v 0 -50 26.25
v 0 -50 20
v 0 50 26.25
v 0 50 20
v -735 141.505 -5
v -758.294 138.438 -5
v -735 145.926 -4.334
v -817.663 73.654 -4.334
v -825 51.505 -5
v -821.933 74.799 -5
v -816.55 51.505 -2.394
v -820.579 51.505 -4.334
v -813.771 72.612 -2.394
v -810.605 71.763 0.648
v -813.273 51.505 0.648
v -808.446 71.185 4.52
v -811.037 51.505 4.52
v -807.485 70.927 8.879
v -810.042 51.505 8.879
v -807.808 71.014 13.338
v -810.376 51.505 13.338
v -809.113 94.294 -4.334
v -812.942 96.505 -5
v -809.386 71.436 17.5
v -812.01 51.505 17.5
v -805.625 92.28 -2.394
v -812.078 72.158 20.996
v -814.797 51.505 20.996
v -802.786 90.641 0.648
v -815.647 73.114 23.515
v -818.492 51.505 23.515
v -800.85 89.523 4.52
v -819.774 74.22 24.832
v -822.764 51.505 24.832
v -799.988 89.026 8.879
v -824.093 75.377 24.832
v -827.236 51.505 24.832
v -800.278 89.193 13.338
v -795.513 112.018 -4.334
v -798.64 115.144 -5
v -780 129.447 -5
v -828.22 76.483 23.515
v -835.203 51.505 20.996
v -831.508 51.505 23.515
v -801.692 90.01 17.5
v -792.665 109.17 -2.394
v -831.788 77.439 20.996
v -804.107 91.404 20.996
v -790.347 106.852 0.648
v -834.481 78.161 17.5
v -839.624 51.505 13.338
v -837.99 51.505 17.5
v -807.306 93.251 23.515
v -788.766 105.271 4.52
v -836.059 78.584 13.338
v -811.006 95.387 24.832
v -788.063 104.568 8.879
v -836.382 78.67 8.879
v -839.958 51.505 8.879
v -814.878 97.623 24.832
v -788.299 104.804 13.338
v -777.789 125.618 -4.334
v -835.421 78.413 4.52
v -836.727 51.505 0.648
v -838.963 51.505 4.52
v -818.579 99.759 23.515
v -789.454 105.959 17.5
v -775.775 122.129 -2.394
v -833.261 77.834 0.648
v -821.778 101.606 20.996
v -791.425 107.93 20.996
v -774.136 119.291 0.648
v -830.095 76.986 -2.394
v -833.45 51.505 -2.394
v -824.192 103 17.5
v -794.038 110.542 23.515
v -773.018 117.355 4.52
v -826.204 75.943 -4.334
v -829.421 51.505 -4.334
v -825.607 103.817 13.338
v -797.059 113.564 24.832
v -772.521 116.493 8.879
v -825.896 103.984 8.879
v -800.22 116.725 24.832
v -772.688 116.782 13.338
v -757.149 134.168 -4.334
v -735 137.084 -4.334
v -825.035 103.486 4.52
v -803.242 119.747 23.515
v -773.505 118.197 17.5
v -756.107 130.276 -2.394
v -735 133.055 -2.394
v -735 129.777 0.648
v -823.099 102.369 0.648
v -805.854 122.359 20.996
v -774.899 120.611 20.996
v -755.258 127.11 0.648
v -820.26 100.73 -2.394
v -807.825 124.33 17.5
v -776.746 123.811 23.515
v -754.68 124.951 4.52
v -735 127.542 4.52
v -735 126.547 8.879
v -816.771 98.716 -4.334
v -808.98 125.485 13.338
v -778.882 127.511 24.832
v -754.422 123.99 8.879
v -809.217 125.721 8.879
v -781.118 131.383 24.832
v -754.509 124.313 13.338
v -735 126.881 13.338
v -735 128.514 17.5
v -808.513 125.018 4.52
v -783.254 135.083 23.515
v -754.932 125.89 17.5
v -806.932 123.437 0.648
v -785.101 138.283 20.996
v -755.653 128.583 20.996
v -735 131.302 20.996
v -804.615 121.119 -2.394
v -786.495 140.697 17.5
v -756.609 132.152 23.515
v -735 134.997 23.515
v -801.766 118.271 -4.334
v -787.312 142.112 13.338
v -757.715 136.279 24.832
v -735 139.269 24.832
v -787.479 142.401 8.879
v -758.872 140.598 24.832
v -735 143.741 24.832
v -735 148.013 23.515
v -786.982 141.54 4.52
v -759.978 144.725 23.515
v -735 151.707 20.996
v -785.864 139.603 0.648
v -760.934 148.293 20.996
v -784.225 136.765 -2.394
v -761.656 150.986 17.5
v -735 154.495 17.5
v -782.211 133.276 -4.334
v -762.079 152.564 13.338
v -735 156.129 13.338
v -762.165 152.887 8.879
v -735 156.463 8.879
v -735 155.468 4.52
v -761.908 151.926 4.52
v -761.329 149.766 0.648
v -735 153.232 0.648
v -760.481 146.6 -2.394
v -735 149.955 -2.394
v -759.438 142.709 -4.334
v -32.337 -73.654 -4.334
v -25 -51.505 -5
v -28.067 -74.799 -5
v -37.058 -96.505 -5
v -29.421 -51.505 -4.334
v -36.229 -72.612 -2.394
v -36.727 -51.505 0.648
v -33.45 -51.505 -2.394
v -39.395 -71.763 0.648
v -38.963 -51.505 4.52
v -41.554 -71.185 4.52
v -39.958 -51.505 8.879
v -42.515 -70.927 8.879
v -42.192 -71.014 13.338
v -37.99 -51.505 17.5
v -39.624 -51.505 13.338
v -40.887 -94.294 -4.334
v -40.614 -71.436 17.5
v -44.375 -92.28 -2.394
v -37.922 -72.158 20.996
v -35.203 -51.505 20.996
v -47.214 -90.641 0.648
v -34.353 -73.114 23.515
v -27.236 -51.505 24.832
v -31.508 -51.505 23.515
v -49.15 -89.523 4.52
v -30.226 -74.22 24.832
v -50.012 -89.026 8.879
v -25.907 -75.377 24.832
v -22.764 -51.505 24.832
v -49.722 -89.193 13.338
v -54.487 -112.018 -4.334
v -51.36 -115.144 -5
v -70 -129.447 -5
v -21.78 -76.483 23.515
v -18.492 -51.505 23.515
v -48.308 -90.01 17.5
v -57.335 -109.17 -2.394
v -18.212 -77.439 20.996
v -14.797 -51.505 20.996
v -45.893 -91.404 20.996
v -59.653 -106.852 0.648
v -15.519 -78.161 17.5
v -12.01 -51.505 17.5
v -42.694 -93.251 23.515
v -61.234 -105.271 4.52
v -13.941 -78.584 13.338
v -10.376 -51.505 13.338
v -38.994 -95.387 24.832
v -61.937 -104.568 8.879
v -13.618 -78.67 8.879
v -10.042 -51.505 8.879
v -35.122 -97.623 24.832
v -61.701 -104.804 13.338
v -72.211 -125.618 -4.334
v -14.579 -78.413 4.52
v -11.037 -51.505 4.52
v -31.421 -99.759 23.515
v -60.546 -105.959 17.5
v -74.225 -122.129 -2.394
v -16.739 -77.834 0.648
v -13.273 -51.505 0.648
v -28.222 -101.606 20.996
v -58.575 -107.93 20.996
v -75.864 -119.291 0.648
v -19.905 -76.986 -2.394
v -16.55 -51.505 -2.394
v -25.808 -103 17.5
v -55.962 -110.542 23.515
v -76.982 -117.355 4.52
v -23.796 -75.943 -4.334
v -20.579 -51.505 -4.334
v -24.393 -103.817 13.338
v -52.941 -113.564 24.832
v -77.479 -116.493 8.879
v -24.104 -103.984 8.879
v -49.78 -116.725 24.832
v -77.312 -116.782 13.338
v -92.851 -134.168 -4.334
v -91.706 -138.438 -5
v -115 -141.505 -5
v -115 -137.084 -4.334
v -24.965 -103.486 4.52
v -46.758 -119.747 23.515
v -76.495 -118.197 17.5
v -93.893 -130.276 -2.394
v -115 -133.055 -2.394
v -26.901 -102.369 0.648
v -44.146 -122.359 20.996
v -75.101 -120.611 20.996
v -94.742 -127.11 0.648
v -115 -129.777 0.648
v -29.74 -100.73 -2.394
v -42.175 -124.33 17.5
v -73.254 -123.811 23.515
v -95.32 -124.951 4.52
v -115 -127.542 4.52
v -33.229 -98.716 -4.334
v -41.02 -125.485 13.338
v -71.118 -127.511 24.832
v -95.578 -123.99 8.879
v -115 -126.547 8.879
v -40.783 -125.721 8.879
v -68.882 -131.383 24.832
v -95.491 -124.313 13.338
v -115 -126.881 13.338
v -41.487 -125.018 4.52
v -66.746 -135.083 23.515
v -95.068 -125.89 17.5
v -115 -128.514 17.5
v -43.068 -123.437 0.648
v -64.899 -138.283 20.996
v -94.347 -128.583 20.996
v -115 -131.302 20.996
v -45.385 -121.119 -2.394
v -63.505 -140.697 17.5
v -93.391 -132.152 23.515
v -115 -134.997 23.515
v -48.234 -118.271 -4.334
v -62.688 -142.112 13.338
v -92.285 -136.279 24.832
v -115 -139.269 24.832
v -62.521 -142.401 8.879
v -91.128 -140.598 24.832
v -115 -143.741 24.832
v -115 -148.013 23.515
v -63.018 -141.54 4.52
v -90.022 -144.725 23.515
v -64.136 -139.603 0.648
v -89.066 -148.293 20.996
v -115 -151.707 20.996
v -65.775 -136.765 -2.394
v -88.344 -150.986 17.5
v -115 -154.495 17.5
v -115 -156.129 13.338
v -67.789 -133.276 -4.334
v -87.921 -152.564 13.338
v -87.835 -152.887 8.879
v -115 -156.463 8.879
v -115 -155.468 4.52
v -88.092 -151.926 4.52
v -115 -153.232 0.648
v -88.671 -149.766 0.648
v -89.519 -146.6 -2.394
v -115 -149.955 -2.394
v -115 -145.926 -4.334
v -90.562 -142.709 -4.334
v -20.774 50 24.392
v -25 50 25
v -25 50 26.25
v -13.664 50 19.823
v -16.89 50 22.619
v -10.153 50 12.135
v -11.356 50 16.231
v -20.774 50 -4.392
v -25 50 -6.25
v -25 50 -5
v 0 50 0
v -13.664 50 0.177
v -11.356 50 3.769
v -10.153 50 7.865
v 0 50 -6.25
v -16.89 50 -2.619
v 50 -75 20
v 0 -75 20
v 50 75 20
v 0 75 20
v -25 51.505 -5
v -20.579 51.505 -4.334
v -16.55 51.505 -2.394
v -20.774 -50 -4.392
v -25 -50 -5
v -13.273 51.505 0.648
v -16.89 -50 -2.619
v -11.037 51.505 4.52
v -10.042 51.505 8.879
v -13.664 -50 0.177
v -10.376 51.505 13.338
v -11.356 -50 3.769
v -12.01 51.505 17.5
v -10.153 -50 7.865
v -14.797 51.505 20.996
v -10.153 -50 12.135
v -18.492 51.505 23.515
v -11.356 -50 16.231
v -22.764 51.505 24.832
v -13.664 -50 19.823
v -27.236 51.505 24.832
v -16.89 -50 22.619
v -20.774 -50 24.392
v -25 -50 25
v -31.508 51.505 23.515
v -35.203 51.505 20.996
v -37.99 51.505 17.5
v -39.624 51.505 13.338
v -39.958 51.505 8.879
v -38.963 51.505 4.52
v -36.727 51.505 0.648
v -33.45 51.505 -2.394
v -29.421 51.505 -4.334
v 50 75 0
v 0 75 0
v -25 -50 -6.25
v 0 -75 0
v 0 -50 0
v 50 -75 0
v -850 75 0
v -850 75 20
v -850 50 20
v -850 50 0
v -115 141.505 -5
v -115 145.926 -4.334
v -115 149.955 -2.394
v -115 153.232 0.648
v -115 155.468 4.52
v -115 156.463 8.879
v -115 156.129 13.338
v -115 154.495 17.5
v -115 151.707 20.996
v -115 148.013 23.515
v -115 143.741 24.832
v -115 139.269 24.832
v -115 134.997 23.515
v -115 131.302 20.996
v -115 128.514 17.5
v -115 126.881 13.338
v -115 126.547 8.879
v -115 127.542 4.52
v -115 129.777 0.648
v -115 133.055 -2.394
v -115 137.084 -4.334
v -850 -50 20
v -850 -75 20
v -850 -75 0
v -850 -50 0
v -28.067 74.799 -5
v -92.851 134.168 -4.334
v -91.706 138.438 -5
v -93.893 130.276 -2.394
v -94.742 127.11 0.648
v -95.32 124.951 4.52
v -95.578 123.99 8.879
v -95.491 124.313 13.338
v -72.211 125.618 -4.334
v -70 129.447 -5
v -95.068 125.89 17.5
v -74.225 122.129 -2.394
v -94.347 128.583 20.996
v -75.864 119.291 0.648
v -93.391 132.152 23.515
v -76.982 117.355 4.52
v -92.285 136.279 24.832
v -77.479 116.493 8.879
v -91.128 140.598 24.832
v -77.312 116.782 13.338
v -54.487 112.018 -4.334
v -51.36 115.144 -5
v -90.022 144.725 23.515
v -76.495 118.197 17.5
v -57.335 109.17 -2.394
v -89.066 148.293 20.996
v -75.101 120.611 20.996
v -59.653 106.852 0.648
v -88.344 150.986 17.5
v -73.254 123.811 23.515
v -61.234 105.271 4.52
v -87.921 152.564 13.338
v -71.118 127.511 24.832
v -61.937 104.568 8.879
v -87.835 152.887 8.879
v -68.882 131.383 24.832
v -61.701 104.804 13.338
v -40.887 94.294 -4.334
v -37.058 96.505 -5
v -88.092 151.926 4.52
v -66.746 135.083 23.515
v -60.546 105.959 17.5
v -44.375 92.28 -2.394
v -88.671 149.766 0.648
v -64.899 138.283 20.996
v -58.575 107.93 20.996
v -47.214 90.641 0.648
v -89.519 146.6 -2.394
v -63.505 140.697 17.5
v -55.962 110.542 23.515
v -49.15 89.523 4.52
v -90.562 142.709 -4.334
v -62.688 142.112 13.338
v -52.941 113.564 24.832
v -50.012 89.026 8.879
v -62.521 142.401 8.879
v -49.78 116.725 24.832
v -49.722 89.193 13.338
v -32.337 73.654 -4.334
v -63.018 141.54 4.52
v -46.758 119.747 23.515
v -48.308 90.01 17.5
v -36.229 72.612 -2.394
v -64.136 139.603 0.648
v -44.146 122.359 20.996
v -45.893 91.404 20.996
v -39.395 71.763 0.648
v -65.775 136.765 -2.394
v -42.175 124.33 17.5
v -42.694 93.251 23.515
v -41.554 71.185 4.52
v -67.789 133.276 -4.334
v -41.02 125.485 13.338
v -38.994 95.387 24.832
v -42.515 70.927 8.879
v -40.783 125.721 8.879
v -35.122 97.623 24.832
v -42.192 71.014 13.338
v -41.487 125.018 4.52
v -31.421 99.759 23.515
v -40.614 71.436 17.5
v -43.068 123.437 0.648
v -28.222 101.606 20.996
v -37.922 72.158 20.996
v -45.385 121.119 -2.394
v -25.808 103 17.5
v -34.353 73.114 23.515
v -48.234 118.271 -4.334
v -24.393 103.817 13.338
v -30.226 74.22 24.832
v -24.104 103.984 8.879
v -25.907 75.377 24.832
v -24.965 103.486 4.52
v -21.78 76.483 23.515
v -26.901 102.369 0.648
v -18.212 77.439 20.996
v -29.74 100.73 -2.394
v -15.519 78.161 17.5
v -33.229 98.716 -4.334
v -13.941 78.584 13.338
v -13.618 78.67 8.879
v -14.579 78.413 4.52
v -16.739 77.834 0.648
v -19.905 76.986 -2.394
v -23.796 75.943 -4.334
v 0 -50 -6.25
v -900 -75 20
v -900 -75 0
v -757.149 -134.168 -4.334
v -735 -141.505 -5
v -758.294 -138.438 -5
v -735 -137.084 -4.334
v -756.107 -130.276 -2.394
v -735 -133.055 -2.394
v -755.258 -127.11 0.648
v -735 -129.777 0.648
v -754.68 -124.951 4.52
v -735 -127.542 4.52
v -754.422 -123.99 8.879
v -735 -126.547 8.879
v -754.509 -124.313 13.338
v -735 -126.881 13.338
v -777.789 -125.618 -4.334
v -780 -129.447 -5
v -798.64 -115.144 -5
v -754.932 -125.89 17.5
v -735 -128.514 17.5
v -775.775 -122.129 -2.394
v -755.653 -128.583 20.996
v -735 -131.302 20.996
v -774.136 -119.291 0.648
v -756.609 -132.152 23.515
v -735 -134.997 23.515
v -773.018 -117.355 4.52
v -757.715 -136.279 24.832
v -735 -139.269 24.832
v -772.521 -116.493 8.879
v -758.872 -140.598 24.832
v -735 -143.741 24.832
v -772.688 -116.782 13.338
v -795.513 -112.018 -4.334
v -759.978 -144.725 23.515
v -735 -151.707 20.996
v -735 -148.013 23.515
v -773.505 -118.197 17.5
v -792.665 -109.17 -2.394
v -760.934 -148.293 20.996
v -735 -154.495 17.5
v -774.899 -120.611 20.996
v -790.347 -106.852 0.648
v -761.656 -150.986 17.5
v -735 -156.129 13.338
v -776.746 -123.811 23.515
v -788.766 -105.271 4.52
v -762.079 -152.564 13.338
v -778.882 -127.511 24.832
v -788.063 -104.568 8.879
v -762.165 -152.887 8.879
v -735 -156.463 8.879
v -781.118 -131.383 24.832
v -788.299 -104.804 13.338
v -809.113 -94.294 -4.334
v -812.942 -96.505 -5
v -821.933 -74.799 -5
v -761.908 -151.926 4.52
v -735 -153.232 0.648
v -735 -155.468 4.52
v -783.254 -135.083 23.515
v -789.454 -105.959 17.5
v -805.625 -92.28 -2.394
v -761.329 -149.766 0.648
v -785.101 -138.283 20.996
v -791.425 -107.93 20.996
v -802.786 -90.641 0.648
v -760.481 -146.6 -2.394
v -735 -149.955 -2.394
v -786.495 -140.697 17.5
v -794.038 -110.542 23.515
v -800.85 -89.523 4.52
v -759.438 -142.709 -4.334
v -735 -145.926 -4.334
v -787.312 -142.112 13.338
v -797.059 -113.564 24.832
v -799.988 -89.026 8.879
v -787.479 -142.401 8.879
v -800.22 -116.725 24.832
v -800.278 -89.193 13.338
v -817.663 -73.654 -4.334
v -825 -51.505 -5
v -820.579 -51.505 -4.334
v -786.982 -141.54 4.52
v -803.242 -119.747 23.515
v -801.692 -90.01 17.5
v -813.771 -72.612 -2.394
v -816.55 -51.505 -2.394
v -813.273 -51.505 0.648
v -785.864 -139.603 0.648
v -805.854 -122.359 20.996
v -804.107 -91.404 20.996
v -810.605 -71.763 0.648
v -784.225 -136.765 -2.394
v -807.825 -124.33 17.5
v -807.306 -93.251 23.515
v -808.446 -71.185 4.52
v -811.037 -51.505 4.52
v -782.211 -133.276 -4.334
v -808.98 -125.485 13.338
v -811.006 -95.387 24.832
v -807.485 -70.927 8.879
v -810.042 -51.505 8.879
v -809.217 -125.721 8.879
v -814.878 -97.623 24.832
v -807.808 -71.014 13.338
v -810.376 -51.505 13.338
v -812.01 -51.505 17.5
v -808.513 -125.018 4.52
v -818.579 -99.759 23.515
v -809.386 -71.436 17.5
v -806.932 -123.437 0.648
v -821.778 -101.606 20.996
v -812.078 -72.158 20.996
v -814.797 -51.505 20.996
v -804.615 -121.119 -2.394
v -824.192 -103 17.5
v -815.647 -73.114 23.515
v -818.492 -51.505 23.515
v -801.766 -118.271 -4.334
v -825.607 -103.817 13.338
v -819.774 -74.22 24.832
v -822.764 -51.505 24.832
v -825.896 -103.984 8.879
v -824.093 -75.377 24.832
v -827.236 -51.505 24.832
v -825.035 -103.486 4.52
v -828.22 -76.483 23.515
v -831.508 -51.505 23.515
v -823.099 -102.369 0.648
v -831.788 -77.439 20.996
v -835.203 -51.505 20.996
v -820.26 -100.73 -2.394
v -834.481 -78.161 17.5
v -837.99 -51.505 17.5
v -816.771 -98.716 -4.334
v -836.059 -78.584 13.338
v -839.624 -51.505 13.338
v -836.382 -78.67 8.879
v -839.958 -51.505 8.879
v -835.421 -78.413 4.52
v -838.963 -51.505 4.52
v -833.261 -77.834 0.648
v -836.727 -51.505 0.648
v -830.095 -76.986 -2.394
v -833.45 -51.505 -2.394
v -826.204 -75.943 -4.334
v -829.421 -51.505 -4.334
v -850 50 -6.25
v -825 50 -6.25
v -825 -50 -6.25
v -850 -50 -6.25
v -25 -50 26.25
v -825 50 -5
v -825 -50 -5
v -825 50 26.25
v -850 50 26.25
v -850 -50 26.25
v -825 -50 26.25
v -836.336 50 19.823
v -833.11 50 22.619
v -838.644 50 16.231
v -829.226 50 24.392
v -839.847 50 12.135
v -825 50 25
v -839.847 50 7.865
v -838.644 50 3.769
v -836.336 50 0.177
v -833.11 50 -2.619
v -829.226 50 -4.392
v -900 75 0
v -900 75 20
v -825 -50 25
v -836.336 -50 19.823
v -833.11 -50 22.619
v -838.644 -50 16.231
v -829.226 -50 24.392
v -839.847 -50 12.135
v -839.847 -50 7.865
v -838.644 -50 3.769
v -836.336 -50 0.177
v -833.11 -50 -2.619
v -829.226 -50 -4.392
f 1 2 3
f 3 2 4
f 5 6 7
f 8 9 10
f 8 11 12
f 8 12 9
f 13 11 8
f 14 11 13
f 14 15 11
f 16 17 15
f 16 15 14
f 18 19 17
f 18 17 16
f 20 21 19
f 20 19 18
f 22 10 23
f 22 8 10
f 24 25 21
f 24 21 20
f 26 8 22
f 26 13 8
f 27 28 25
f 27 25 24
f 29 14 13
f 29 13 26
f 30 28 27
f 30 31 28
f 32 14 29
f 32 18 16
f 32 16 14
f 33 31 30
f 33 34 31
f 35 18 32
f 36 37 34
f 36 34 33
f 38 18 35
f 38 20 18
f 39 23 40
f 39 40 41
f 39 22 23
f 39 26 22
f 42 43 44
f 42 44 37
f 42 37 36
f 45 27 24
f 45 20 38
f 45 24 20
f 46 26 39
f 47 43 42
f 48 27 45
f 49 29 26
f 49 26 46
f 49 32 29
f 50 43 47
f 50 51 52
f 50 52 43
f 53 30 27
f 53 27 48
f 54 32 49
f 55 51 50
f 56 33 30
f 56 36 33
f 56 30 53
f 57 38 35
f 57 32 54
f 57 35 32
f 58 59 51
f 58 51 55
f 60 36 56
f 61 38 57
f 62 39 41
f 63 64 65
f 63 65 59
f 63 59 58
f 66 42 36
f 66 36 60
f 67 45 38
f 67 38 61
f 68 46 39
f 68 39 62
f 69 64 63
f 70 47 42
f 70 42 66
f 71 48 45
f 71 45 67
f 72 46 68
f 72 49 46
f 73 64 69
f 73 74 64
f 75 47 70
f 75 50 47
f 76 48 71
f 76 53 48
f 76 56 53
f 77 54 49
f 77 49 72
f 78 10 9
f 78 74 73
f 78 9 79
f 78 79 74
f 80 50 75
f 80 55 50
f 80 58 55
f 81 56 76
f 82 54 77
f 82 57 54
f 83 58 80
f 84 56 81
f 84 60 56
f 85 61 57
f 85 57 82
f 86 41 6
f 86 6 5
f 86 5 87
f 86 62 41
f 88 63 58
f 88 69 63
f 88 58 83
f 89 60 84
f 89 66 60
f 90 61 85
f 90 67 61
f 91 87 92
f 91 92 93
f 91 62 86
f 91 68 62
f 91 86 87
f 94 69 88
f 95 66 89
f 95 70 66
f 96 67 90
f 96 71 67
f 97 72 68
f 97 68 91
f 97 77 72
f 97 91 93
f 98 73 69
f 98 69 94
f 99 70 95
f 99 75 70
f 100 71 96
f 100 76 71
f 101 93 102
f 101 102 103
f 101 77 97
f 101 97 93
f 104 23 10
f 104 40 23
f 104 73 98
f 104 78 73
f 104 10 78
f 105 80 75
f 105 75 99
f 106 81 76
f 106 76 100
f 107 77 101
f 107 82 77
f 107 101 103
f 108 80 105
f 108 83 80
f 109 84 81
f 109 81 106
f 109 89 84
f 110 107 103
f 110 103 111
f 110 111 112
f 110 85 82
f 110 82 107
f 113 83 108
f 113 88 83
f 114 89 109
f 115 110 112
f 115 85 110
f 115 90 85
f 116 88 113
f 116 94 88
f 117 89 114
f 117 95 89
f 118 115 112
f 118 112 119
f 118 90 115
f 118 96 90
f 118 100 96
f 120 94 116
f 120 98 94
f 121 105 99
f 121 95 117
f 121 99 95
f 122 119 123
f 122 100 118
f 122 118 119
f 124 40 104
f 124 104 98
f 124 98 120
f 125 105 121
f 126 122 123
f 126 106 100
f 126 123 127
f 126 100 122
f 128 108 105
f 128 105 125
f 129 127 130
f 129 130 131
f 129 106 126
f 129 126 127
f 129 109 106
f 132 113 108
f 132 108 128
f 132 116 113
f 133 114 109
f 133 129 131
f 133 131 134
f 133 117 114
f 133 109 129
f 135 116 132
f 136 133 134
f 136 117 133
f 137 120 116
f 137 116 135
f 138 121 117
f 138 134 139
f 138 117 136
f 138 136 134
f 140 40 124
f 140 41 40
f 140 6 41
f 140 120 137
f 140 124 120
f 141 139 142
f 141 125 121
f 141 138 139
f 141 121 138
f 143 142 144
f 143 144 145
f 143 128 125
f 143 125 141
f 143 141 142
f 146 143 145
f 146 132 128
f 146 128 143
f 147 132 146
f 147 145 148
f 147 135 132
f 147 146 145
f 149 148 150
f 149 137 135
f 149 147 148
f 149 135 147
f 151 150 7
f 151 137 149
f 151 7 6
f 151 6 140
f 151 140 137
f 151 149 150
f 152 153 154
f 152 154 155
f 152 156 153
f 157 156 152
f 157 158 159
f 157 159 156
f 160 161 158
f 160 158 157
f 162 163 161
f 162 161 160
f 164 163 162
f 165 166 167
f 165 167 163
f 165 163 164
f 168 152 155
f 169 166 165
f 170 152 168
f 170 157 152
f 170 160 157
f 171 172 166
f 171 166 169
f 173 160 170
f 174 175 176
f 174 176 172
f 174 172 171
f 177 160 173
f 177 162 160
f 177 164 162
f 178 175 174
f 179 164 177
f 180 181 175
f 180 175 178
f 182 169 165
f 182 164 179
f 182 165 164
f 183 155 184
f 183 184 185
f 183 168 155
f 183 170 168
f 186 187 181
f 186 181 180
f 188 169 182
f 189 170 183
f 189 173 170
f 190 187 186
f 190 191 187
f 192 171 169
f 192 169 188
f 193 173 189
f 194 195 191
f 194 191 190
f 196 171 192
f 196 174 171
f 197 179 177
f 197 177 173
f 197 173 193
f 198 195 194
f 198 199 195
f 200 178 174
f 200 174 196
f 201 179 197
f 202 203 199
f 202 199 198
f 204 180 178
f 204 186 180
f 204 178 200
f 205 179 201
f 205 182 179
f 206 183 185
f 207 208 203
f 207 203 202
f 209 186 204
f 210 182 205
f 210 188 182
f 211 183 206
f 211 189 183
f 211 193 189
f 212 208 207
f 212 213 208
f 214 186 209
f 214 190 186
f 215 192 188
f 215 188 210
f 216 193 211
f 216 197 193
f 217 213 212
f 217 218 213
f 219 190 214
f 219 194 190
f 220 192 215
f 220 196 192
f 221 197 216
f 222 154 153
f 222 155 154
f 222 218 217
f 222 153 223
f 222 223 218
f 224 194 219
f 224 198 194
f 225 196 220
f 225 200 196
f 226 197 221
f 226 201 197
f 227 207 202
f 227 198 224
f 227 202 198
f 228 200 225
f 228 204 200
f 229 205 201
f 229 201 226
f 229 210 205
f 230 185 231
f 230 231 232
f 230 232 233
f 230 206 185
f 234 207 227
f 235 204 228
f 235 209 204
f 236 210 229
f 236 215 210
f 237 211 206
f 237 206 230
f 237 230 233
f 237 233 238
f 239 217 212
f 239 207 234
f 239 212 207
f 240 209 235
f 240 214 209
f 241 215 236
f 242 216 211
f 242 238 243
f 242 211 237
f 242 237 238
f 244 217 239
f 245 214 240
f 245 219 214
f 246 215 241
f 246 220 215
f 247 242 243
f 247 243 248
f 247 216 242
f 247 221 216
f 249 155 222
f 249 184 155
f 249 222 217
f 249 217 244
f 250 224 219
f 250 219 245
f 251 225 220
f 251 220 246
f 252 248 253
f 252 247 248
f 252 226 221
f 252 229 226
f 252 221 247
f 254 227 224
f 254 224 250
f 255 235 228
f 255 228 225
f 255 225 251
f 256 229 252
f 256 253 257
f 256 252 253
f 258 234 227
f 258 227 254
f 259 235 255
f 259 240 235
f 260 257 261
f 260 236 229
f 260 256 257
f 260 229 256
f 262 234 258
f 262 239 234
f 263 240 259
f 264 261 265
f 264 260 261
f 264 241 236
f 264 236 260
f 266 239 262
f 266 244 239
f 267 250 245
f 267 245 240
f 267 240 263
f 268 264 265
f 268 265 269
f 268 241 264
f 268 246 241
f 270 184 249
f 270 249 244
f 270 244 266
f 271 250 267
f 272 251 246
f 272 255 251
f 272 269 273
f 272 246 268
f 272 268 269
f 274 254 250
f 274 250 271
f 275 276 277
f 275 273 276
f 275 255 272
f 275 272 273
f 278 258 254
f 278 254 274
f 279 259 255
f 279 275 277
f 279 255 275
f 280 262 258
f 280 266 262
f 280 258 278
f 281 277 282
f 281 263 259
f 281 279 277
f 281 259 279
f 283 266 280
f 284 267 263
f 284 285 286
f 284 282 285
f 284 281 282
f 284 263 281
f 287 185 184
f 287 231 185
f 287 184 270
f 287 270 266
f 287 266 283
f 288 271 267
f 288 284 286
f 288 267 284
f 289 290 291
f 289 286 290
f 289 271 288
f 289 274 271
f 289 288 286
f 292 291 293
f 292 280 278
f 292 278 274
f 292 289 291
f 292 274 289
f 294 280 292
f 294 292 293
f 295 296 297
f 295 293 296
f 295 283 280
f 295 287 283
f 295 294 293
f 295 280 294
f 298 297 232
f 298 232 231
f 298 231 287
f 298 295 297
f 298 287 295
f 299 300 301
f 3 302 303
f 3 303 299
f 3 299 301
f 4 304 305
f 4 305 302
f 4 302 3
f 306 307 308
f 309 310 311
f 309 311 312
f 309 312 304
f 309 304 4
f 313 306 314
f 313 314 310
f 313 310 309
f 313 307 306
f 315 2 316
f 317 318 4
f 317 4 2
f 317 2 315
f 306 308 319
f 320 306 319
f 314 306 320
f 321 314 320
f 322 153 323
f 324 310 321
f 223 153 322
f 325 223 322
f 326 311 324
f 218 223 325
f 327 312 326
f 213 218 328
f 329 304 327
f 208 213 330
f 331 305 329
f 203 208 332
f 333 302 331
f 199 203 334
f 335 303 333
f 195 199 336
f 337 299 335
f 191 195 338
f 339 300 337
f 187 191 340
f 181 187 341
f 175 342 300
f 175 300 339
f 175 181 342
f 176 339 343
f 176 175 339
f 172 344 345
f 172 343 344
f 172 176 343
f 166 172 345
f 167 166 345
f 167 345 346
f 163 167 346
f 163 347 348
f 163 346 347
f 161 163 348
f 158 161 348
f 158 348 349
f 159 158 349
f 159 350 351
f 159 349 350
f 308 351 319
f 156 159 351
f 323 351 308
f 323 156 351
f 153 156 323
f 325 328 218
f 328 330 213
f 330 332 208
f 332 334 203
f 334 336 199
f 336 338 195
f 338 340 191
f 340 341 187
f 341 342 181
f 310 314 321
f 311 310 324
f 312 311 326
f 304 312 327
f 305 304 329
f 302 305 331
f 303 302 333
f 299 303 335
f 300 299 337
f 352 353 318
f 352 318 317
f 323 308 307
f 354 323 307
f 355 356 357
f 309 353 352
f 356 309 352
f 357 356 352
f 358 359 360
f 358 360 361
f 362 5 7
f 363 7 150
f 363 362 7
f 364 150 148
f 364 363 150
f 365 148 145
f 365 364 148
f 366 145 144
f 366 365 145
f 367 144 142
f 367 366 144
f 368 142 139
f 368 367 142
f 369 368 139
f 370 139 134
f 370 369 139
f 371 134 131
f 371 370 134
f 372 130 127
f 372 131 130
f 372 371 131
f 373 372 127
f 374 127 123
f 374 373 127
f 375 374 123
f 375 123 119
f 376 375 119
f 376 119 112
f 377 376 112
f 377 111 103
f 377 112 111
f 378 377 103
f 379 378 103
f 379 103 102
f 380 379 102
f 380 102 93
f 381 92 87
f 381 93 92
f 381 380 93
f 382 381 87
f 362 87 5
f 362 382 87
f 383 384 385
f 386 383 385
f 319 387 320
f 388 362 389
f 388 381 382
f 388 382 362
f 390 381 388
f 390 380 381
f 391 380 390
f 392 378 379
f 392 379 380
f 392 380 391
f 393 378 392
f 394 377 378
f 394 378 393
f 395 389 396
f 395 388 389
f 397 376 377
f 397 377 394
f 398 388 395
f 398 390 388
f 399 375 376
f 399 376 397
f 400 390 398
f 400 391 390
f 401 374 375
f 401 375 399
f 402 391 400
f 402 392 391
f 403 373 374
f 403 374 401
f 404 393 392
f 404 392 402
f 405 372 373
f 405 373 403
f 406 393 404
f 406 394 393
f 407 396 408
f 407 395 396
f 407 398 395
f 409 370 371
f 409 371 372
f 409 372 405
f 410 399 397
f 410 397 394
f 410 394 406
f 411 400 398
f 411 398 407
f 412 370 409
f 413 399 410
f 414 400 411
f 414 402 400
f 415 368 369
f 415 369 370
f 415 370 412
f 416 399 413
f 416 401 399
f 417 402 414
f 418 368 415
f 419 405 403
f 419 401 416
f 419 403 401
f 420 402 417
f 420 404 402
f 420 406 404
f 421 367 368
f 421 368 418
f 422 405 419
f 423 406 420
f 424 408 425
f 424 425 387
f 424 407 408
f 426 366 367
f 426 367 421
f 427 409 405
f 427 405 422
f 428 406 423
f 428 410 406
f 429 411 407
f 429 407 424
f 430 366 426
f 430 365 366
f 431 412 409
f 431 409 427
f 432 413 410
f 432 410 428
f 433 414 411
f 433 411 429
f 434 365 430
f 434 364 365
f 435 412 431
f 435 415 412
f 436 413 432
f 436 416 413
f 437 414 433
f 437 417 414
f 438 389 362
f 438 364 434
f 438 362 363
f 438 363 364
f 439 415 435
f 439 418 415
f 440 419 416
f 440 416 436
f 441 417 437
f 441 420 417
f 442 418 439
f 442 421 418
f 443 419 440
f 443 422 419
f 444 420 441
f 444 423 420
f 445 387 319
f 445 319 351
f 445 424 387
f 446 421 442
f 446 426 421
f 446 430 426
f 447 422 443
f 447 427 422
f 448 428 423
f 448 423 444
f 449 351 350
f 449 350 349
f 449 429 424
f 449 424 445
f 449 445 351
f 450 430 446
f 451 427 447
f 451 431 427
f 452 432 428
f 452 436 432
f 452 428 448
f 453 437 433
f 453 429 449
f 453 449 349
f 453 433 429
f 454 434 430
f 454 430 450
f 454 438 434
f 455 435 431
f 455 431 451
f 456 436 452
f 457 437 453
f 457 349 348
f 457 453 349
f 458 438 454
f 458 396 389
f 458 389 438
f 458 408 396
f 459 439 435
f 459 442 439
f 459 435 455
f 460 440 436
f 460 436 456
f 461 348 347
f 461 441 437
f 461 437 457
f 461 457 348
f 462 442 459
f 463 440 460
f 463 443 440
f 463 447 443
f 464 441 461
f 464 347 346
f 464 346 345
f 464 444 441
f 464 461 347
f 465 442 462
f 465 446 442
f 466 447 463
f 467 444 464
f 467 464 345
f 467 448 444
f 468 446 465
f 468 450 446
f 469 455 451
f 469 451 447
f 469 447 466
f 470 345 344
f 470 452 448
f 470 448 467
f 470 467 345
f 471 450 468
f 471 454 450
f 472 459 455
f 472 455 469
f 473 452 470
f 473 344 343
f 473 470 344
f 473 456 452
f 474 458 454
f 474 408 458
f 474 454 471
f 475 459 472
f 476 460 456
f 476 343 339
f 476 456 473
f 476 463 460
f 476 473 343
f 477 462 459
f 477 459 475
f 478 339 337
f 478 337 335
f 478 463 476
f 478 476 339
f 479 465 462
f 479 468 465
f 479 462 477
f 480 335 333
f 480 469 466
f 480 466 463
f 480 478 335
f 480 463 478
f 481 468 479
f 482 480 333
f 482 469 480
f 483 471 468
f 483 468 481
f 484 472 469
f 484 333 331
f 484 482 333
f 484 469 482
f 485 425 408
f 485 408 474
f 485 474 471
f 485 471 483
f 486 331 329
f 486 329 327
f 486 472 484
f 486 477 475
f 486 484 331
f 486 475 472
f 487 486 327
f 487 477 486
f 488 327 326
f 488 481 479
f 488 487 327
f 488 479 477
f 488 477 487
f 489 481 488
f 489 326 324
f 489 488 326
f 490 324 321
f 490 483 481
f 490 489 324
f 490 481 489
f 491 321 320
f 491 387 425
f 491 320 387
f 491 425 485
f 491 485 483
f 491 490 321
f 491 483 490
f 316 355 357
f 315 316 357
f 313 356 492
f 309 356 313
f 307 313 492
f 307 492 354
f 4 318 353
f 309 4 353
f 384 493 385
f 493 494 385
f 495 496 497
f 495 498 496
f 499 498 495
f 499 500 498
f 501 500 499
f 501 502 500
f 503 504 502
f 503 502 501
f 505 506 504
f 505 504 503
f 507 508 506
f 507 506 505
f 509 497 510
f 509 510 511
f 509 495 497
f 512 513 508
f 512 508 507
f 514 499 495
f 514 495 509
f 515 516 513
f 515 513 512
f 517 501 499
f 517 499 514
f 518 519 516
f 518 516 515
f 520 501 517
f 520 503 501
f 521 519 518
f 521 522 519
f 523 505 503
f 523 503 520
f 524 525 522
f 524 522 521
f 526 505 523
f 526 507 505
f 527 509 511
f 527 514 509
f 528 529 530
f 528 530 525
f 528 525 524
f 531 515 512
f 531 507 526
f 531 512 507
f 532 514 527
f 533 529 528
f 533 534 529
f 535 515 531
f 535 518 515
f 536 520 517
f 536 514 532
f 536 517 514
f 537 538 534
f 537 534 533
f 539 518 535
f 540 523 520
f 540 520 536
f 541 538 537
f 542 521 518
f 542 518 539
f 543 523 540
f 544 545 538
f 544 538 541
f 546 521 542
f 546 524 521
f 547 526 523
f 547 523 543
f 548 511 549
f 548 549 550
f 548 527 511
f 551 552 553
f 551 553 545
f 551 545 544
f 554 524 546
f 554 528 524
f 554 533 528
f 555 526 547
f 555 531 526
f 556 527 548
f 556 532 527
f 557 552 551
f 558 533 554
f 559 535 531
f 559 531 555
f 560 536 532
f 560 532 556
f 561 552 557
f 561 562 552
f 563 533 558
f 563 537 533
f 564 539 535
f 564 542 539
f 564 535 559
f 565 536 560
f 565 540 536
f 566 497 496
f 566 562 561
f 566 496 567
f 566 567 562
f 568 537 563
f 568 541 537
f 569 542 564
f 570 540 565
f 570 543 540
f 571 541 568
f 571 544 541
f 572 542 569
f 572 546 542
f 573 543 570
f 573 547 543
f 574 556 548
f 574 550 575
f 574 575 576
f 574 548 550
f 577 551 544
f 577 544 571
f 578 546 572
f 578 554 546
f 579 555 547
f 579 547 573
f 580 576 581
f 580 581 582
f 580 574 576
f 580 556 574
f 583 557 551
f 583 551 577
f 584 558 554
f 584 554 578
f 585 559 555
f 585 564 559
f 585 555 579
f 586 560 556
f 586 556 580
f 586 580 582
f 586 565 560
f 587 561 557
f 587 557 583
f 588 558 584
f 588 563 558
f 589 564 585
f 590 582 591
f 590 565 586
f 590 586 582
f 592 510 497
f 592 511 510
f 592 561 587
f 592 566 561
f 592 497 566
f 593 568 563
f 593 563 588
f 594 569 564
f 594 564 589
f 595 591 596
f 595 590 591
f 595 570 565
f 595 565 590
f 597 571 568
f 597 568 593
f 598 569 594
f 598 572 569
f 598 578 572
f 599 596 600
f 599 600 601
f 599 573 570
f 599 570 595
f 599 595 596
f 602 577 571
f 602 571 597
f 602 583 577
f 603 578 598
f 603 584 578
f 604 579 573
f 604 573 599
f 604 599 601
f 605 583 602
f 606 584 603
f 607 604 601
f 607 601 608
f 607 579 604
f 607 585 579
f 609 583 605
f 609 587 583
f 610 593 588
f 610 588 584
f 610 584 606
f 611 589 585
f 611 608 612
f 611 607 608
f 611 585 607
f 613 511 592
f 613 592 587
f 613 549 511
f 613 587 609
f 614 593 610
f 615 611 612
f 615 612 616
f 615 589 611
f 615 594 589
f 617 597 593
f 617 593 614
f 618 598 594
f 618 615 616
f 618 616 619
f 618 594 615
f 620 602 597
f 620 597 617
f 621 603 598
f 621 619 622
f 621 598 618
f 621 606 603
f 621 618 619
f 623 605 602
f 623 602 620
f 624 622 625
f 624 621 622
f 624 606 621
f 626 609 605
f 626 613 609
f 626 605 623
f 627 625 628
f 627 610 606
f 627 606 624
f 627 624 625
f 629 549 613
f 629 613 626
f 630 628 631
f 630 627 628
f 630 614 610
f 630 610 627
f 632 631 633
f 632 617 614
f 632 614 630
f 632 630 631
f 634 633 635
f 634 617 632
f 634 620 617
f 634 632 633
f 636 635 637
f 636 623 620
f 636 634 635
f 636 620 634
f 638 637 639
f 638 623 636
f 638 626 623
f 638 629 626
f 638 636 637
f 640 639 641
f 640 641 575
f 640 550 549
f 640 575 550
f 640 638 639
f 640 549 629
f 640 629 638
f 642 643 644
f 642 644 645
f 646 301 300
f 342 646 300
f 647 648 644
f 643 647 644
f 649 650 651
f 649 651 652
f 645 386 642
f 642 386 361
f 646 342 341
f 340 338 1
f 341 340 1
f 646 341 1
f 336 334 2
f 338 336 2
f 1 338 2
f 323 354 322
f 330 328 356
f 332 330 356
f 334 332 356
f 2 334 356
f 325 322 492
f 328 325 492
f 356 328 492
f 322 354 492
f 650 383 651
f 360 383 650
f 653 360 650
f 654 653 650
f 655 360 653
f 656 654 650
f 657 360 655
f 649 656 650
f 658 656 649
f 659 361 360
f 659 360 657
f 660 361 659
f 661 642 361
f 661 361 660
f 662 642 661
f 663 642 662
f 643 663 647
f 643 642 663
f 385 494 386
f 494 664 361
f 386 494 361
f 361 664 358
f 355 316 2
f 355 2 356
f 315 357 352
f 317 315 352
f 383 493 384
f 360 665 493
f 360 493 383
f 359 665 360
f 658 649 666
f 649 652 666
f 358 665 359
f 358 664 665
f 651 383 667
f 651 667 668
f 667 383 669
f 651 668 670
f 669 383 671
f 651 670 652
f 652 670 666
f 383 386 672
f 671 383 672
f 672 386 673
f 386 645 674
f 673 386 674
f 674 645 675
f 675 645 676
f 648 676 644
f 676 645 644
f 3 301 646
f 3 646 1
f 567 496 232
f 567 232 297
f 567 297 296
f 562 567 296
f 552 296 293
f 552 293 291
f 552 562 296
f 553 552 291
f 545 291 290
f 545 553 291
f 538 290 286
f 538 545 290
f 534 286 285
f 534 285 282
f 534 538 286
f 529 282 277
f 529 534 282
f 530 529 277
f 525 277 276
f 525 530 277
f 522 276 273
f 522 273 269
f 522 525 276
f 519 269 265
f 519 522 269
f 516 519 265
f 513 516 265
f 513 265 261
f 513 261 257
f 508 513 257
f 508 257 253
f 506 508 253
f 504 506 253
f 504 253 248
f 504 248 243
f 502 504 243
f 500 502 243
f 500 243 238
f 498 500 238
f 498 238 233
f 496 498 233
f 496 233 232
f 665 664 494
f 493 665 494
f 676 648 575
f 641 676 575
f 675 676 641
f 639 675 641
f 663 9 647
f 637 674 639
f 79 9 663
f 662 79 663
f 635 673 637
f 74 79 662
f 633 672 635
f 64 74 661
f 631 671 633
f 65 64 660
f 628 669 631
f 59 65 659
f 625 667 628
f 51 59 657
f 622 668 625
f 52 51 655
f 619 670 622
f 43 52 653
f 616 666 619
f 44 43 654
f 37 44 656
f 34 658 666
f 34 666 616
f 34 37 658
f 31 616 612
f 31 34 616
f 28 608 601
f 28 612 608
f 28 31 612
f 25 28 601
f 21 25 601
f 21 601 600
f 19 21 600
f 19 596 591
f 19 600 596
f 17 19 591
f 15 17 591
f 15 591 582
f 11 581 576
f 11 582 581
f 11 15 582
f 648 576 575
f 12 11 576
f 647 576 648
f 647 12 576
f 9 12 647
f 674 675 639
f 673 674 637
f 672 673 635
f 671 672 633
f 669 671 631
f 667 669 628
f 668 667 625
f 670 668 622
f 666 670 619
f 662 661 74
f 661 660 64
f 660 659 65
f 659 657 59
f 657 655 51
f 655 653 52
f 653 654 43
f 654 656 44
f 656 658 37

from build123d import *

# Parameters (mm, degrees)
SKETCH1_W           = 100
SKETCH1_H           = 75
SKETCH1_H_2         = 150
BOSS_EXTRUDE1_DEPTH = 20
SKETCH4_W           = 50
SKETCH4_H           = 150
BOSS_EXTRUDE3_DEPTH = 6.25
SKETCH5_W           = 50
SKETCH5_H           = 150
BOSS_EXTRUDE4_DEPTH = 6.25
SKETCH21_W          = 850
SKETCH21_H          = 32.5
CUT_EXTRUDE2_DEPTH  = 25
CUT_EXTRUDE3_START  = -150
SKETCH21_2_W        = 850
SKETCH21_2_H        = 32.5
CUT_EXTRUDE3_DEPTH  = 25
SWEEP1_PROFILE_R    = 15
CUT_EXTRUDE1_DEPTH  = 50


with BuildPart() as part:
    # Sketch1 → Boss-Extrude1 (new body)
    with BuildSketch(Plane.XY):
        with Locations((-850, 37.5)):
            Rectangle(SKETCH1_W, SKETCH1_H)
        with Locations((-850, -37.5)):
            Rectangle(SKETCH1_W, SKETCH1_H)
        Rectangle(SKETCH1_W, SKETCH1_H_2)
    extrude(amount=BOSS_EXTRUDE1_DEPTH)

    # Sketch4 → Boss-Extrude3 (add)
    with BuildSketch(Plane(origin=(0, 0, 0), x_dir=(-1, 0, 0), z_dir=(0, 0, -1))):
        with Locations((25, 0)):
            Rectangle(SKETCH4_W, SKETCH4_H)
        with Locations((825, 0)):
            Rectangle(SKETCH4_W, SKETCH4_H)
    extrude(amount=BOSS_EXTRUDE3_DEPTH)

    # Sketch5 → Boss-Extrude4 (add)
    with BuildSketch(Plane.XY.offset(20)):
        with Locations((-825, 0)):
            Rectangle(SKETCH5_W, SKETCH5_H)
        with Locations((-25, 0)):
            Rectangle(SKETCH5_W, SKETCH5_H)
    extrude(amount=BOSS_EXTRUDE4_DEPTH)

    # Sketch21 → Cut-Extrude2 (cut)
    with BuildSketch(Plane(origin=(0, 75, 0), x_dir=(1, 0, 0), z_dir=(0, 1, 0))):
        with Locations((-425, -10)):
            Rectangle(SKETCH21_W, SKETCH21_H)
    extrude(amount=-CUT_EXTRUDE2_DEPTH, mode=Mode.SUBTRACT)

    # Sketch21<2> → Cut-Extrude3 (cut)
    with BuildSketch(Plane(origin=(0, 75, 0), x_dir=(1, 0, 0), z_dir=(0, 1, 0)).offset(CUT_EXTRUDE3_START)):
        with Locations((-425, -10)):
            Rectangle(SKETCH21_2_W, SKETCH21_2_H)
    extrude(amount=CUT_EXTRUDE3_DEPTH, mode=Mode.SUBTRACT)

    # Sweep1: sweep along a path in Sketch6
    with BuildLine(Plane.XY.offset(10)) as sweep1_path:
        Line((-115, -141.504877042), (-735, -141.504877042))
        ThreePointArc((-735, -141.504877042), (-798.639610307, -115.144487349), (-825, -51.504877042))
        Line((-825, -51.504877042), (-825, 51.504877042))
        ThreePointArc((-825, 51.504877042), (-798.639610307, 115.144487349), (-735, 141.504877042))
        Line((-735, 141.504877042), (-115, 141.504877042))
        ThreePointArc((-115, 141.504877042), (-51.360389693, 115.144487349), (-25, 51.504877042))
        Line((-25, 51.504877042), (-25, -51.504877042))
        ThreePointArc((-25, -51.504877042), (-51.360389693, -115.144487349), (-115, -141.504877042))
    # Sweep1 profile (on start of the path) → Sweep1 (sweep)
    with BuildSketch(Plane(origin=(-115, -141.504877042, 10), x_dir=(0, 0, -1), z_dir=(-1, 0, 0))):
        Circle(SWEEP1_PROFILE_R)
    sweep(path=sweep1_path.line)

    # Sketch19 → Cut-Extrude1 (cut, symmetric)
    with BuildSketch(Plane(origin=(0, 0, 0), x_dir=(1, 0, 0), z_dir=(0, 1, 0))):
        with BuildLine():
            Line((-825, -26.25), (-825, -25))
            ThreePointArc((-825, -25), (-810, -10), (-825, 5))
            Line((-825, 5), (-825, 6.25))
            Line((-825, 6.25), (-800, 6.25))
            Line((-800, 6.25), (-800, -26.25))
            Line((-800, -26.25), (-825, -26.25))
        make_face()
        with BuildLine():
            Line((-50, -26.25), (-25, -26.25))
            Line((-25, -26.25), (-25, -25))
            ThreePointArc((-25, -25), (-40, -10), (-25, 5))
            Line((-25, 5), (-25, 6.25))
            Line((-25, 6.25), (-50, 6.25))
            Line((-50, 6.25), (-50, -26.25))
        make_face()
    extrude(amount=CUT_EXTRUDE1_DEPTH, both=True, mode=Mode.SUBTRACT)


solid = part.part
